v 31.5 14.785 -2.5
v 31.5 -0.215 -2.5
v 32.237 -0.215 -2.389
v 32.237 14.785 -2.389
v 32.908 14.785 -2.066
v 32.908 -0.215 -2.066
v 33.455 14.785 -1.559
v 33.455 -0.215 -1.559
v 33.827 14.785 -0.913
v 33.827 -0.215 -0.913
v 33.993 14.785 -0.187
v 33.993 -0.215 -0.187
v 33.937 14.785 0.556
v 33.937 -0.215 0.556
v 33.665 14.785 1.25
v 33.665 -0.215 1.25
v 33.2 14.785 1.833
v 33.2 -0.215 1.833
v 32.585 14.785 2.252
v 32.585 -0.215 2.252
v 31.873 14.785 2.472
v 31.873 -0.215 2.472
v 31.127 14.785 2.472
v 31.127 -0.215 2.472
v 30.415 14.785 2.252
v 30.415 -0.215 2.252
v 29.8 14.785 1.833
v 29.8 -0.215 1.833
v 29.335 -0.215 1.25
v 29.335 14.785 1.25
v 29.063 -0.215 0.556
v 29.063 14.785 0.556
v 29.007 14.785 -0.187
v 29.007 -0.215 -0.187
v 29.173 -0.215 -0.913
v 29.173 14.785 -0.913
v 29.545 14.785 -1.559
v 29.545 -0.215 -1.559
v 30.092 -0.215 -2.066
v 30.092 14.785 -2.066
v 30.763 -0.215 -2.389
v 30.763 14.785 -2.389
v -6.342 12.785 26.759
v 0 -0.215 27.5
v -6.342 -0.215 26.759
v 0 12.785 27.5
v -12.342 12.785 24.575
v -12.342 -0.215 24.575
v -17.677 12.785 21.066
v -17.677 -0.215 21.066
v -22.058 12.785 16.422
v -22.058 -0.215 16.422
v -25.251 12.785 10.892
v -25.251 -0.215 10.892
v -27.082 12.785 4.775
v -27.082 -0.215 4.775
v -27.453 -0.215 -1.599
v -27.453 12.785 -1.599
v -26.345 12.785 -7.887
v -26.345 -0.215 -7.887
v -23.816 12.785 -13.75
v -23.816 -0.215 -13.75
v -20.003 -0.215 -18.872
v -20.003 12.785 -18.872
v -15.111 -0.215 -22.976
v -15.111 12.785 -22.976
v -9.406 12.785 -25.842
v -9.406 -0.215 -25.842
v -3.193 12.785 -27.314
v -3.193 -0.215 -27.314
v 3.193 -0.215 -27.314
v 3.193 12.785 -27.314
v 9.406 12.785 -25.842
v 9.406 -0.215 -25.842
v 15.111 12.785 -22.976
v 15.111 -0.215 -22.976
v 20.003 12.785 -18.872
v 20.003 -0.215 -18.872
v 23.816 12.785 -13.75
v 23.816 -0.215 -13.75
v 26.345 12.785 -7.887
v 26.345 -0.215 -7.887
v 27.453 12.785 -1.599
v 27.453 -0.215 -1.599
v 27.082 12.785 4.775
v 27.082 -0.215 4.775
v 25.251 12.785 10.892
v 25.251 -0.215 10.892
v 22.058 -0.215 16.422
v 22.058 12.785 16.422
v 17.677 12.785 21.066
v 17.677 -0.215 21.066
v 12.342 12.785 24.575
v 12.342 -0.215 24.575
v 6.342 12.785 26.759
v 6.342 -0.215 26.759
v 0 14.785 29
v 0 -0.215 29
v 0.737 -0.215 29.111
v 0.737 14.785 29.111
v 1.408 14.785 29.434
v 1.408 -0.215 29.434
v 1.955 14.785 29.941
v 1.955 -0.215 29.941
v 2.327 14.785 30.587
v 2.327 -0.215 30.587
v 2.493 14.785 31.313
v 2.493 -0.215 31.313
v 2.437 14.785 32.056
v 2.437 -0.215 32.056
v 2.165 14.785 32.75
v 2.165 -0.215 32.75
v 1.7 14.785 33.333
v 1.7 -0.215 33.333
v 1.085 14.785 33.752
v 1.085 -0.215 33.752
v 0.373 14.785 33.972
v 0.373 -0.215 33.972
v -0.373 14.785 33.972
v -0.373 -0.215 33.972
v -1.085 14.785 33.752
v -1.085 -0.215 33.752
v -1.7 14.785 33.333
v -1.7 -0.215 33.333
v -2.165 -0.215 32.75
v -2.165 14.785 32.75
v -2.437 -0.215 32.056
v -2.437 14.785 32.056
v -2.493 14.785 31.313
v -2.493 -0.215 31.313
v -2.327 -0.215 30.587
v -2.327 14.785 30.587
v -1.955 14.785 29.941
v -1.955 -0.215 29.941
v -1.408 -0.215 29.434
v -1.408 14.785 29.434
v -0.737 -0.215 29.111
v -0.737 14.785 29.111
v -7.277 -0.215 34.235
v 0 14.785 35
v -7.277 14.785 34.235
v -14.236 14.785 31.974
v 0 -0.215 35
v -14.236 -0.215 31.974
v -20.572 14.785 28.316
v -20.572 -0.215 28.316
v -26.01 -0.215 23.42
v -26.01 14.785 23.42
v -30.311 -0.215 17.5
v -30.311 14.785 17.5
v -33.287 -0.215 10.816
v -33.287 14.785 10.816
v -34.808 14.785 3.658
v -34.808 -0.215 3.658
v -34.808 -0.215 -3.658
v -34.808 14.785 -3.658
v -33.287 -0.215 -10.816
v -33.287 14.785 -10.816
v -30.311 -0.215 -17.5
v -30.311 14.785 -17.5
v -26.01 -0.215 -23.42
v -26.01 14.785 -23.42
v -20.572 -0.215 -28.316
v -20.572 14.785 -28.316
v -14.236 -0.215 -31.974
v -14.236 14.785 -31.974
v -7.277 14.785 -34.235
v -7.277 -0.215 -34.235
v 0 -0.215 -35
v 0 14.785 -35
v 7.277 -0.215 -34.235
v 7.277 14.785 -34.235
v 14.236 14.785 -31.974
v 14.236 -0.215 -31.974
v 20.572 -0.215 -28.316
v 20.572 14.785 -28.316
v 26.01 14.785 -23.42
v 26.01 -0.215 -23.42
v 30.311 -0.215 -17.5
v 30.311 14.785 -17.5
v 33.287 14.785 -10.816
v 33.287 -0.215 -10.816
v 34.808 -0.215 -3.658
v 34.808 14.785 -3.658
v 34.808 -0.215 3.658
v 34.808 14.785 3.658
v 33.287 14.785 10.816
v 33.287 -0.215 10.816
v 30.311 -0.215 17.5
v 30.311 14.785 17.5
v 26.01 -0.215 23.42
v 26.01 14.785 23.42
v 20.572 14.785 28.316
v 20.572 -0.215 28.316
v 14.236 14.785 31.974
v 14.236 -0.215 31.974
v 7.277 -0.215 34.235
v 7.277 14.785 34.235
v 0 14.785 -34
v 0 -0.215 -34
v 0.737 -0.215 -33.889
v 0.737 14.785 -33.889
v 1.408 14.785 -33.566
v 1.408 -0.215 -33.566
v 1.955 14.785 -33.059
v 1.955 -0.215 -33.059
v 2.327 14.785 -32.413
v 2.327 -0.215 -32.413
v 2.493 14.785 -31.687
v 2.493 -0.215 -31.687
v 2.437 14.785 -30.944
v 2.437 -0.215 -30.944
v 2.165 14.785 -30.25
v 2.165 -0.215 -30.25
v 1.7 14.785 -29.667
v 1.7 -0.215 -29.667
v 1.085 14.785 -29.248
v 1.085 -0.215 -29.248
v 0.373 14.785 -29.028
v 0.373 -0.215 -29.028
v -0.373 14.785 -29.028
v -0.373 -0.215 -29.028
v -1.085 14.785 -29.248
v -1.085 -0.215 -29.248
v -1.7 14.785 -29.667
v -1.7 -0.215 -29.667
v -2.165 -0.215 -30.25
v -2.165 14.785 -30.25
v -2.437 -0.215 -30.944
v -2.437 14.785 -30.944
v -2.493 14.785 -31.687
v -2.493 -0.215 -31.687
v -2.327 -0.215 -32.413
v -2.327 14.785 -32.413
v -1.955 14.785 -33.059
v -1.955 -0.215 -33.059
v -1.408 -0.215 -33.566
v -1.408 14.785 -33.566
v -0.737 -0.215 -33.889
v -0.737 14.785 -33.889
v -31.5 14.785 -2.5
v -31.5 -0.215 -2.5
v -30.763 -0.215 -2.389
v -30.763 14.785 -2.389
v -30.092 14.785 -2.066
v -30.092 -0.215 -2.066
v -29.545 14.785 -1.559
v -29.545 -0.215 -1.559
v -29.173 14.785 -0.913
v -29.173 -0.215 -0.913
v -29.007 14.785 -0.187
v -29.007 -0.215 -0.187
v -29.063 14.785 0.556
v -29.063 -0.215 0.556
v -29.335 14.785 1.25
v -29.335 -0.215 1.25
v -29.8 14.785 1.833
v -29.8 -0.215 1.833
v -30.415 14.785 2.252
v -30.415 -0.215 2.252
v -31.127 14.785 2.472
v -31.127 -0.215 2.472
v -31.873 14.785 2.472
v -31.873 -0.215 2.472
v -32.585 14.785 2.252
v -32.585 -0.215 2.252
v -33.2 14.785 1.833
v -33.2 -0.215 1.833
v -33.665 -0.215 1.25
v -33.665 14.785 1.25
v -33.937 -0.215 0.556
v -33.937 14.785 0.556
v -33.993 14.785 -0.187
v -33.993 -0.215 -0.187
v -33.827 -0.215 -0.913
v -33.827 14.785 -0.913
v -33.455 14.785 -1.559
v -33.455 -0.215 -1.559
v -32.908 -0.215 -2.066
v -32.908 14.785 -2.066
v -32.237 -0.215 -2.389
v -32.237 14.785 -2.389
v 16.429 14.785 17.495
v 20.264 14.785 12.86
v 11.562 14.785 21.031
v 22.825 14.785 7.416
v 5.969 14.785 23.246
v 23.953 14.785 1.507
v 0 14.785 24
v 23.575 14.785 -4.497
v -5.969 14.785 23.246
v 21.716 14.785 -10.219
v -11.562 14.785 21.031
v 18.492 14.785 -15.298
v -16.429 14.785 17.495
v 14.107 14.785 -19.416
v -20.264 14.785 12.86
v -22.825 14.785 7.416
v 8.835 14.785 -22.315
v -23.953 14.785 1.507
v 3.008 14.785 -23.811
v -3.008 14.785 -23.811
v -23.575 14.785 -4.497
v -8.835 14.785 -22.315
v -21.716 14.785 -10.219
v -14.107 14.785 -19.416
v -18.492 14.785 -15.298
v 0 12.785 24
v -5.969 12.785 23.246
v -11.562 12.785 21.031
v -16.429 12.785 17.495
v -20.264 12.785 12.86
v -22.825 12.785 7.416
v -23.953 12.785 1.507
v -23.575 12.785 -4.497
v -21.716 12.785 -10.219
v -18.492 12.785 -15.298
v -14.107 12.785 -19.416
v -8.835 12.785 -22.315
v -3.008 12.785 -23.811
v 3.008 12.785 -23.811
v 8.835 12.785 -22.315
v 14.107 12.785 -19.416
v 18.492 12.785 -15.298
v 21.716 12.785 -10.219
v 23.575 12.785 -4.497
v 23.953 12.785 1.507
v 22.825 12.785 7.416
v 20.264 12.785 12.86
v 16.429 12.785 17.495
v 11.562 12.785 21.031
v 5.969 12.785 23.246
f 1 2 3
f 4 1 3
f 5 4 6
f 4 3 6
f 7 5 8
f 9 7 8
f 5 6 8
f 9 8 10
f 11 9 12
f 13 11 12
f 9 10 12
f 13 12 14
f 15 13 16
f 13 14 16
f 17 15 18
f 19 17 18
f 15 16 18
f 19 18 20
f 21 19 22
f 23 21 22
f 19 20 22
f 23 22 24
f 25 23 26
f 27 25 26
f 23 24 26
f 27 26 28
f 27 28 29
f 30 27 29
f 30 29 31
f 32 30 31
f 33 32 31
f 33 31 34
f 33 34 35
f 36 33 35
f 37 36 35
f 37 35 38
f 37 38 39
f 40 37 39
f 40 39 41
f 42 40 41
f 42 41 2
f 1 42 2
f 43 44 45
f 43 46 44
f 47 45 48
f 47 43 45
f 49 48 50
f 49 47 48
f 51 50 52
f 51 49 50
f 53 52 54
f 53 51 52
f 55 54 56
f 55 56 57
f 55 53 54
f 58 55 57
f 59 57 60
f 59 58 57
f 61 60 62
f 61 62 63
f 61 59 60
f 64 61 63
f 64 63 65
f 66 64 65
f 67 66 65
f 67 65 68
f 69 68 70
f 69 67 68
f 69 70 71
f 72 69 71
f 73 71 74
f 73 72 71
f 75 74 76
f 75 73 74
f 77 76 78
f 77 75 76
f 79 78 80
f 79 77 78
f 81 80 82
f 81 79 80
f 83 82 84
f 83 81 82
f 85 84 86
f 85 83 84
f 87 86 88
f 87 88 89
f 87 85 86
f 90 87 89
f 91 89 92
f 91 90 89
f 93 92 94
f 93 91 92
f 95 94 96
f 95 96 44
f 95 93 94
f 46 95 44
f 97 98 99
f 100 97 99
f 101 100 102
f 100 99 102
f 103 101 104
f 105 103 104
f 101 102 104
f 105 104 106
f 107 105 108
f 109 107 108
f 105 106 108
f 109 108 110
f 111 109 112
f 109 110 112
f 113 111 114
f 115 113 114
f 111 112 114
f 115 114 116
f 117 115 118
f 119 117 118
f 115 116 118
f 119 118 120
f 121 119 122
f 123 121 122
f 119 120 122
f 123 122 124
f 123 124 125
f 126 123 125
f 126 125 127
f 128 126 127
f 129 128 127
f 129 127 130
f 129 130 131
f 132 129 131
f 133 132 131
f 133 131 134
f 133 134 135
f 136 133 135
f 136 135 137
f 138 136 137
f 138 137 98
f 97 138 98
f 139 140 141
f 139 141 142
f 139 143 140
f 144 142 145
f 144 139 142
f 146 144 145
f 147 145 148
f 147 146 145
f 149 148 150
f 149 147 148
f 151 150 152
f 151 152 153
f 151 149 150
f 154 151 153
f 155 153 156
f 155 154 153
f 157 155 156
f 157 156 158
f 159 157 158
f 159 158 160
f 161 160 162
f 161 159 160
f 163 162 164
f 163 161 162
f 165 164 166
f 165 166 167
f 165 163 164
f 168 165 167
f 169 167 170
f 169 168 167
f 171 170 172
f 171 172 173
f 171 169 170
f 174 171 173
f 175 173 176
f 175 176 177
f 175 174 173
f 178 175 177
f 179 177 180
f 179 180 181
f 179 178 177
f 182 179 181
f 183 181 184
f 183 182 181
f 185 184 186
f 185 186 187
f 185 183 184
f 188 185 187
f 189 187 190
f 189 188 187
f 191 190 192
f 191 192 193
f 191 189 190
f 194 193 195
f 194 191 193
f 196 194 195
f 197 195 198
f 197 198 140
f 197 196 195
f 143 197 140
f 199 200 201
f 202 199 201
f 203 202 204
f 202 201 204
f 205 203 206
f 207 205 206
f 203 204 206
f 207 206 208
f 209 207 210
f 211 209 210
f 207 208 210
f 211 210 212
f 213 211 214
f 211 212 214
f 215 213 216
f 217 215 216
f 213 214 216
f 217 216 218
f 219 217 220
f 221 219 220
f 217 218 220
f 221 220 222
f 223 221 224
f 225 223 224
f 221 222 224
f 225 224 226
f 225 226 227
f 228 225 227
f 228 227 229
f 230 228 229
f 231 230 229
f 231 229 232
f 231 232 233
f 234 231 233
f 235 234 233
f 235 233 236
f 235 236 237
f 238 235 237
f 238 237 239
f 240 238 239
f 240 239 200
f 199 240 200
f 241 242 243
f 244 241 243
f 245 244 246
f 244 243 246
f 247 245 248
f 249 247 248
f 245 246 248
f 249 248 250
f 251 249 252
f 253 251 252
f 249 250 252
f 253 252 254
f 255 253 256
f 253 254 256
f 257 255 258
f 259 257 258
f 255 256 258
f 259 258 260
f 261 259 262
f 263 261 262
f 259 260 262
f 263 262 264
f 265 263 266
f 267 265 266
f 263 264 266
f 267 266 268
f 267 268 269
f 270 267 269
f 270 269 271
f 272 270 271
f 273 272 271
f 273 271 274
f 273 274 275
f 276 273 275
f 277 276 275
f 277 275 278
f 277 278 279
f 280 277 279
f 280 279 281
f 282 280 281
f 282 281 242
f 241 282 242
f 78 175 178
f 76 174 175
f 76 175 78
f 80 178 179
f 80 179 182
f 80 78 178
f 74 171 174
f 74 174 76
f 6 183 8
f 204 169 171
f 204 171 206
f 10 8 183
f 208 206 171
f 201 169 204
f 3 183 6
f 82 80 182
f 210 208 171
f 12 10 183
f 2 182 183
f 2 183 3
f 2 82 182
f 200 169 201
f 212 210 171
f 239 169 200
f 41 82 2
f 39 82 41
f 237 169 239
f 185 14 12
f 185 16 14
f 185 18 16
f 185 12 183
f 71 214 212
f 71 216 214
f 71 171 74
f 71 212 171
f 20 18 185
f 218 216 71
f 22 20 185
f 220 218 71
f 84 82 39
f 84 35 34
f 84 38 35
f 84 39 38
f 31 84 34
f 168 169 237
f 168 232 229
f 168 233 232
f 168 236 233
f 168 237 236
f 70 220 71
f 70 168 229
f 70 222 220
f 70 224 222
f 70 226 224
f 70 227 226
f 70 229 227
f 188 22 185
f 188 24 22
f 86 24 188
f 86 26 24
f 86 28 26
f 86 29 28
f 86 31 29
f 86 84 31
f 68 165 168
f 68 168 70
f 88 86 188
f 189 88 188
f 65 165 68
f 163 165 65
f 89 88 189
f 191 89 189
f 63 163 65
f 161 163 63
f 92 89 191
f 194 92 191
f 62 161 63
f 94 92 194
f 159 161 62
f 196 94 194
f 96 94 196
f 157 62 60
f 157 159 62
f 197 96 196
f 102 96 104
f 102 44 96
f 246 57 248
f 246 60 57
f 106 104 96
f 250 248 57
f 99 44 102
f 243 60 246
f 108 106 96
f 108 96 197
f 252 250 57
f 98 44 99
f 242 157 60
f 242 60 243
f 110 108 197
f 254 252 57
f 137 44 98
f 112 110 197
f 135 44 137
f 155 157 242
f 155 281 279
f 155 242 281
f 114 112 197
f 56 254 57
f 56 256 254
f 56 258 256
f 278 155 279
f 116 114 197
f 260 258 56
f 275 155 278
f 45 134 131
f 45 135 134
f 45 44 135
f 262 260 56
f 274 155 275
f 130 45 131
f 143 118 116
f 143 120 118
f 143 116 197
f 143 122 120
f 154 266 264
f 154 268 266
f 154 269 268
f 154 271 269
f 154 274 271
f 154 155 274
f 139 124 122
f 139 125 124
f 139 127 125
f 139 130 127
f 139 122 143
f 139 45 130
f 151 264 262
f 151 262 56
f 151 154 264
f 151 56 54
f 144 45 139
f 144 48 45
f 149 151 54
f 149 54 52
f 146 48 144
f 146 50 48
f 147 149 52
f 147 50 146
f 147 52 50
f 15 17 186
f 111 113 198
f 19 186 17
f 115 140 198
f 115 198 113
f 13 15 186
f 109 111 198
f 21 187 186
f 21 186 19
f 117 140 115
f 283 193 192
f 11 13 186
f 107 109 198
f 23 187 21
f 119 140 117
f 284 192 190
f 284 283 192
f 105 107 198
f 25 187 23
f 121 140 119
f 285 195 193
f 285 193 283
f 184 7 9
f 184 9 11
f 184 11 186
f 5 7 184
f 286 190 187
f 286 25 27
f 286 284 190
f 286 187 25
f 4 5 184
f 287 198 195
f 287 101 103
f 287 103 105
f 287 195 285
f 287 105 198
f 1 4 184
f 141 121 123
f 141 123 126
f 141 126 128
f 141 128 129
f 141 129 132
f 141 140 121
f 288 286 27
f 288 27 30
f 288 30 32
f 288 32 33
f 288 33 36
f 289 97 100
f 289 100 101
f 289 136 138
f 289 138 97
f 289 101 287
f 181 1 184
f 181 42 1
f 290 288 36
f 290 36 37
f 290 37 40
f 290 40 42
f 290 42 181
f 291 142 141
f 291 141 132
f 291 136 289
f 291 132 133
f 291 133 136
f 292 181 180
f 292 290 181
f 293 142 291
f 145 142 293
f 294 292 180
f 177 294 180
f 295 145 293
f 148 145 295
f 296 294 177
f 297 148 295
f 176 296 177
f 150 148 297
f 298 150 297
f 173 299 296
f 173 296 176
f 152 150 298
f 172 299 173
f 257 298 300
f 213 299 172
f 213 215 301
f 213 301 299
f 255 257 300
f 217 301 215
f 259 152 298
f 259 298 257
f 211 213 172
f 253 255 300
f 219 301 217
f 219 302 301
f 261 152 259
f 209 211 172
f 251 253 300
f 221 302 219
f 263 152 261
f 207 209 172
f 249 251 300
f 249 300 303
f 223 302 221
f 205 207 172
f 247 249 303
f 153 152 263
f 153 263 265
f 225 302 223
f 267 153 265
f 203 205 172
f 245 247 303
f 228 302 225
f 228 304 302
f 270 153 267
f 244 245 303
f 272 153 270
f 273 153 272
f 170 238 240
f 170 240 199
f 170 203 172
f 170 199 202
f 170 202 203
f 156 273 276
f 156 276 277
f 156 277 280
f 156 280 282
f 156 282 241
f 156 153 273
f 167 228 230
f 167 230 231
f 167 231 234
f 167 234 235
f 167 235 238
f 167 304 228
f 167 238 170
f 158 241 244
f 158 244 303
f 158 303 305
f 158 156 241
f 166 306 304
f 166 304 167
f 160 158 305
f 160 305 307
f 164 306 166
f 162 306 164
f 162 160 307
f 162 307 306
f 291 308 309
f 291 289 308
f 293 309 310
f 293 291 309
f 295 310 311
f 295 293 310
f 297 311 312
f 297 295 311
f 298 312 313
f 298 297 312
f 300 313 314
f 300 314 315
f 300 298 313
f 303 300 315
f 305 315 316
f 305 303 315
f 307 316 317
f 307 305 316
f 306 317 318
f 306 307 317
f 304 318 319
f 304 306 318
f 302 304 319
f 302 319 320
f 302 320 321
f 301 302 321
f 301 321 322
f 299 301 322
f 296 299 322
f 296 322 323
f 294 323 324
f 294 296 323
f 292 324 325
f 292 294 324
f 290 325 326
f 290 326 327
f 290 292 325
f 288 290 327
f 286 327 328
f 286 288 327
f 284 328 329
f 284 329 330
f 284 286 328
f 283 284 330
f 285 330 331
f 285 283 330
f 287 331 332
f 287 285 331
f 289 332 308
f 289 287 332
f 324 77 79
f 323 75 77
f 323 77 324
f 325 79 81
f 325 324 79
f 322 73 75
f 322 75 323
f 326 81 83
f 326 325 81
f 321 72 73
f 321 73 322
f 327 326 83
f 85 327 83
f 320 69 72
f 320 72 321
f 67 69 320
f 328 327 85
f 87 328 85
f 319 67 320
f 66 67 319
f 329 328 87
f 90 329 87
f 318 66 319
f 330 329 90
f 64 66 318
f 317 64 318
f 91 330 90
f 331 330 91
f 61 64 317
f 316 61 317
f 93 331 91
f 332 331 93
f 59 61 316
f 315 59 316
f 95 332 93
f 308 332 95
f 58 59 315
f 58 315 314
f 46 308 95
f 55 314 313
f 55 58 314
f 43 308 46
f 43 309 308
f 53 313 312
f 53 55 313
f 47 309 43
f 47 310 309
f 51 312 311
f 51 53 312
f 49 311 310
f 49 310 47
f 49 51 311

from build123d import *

# Parameters (mm, degrees)
SKETCH_2_R          = 2.5
CUT_EXTRUDE_1_DEPTH = 22


with BuildPart() as part:
    # Эскиз1 → Повернуть1 (revolve)
    with BuildSketch(Plane.XY, mode=Mode.PRIVATE) as revolve_1_sk:
        Polygon((24, 14.784875022), (35, 14.784875022), (35, -0.215124978), (27.5, -0.215124978), (27.5, 12.784875022), (24, 12.784875022), align=None)
    revolve(revolve_1_sk.sketch.rotate(Axis((0, 60.609800664, 0), (0, -1, 0)), 90), axis=Axis((0, 60.609800664, 0), (0, -1, 0)))

    # Эскиз2 → Вырез-Вытянуть1 (cut)
    with BuildSketch(Plane.XZ.offset(0.215124978)):
        with Locations(Location((0, 31.5, 0), (0, 0, 270))):
            Circle(SKETCH_2_R)
        with Locations(Location((0, -31.5, 0), (0, 0, 270))):
            Circle(SKETCH_2_R)
        with Locations(Location((31.5, 0, 0), (0, 0, 270))):
            Circle(SKETCH_2_R)
        with Locations(Location((-31.5, 0, 0), (0, 0, 270))):
            Circle(SKETCH_2_R)
    extrude(amount=-CUT_EXTRUDE_1_DEPTH, mode=Mode.SUBTRACT)


solid = part.part
